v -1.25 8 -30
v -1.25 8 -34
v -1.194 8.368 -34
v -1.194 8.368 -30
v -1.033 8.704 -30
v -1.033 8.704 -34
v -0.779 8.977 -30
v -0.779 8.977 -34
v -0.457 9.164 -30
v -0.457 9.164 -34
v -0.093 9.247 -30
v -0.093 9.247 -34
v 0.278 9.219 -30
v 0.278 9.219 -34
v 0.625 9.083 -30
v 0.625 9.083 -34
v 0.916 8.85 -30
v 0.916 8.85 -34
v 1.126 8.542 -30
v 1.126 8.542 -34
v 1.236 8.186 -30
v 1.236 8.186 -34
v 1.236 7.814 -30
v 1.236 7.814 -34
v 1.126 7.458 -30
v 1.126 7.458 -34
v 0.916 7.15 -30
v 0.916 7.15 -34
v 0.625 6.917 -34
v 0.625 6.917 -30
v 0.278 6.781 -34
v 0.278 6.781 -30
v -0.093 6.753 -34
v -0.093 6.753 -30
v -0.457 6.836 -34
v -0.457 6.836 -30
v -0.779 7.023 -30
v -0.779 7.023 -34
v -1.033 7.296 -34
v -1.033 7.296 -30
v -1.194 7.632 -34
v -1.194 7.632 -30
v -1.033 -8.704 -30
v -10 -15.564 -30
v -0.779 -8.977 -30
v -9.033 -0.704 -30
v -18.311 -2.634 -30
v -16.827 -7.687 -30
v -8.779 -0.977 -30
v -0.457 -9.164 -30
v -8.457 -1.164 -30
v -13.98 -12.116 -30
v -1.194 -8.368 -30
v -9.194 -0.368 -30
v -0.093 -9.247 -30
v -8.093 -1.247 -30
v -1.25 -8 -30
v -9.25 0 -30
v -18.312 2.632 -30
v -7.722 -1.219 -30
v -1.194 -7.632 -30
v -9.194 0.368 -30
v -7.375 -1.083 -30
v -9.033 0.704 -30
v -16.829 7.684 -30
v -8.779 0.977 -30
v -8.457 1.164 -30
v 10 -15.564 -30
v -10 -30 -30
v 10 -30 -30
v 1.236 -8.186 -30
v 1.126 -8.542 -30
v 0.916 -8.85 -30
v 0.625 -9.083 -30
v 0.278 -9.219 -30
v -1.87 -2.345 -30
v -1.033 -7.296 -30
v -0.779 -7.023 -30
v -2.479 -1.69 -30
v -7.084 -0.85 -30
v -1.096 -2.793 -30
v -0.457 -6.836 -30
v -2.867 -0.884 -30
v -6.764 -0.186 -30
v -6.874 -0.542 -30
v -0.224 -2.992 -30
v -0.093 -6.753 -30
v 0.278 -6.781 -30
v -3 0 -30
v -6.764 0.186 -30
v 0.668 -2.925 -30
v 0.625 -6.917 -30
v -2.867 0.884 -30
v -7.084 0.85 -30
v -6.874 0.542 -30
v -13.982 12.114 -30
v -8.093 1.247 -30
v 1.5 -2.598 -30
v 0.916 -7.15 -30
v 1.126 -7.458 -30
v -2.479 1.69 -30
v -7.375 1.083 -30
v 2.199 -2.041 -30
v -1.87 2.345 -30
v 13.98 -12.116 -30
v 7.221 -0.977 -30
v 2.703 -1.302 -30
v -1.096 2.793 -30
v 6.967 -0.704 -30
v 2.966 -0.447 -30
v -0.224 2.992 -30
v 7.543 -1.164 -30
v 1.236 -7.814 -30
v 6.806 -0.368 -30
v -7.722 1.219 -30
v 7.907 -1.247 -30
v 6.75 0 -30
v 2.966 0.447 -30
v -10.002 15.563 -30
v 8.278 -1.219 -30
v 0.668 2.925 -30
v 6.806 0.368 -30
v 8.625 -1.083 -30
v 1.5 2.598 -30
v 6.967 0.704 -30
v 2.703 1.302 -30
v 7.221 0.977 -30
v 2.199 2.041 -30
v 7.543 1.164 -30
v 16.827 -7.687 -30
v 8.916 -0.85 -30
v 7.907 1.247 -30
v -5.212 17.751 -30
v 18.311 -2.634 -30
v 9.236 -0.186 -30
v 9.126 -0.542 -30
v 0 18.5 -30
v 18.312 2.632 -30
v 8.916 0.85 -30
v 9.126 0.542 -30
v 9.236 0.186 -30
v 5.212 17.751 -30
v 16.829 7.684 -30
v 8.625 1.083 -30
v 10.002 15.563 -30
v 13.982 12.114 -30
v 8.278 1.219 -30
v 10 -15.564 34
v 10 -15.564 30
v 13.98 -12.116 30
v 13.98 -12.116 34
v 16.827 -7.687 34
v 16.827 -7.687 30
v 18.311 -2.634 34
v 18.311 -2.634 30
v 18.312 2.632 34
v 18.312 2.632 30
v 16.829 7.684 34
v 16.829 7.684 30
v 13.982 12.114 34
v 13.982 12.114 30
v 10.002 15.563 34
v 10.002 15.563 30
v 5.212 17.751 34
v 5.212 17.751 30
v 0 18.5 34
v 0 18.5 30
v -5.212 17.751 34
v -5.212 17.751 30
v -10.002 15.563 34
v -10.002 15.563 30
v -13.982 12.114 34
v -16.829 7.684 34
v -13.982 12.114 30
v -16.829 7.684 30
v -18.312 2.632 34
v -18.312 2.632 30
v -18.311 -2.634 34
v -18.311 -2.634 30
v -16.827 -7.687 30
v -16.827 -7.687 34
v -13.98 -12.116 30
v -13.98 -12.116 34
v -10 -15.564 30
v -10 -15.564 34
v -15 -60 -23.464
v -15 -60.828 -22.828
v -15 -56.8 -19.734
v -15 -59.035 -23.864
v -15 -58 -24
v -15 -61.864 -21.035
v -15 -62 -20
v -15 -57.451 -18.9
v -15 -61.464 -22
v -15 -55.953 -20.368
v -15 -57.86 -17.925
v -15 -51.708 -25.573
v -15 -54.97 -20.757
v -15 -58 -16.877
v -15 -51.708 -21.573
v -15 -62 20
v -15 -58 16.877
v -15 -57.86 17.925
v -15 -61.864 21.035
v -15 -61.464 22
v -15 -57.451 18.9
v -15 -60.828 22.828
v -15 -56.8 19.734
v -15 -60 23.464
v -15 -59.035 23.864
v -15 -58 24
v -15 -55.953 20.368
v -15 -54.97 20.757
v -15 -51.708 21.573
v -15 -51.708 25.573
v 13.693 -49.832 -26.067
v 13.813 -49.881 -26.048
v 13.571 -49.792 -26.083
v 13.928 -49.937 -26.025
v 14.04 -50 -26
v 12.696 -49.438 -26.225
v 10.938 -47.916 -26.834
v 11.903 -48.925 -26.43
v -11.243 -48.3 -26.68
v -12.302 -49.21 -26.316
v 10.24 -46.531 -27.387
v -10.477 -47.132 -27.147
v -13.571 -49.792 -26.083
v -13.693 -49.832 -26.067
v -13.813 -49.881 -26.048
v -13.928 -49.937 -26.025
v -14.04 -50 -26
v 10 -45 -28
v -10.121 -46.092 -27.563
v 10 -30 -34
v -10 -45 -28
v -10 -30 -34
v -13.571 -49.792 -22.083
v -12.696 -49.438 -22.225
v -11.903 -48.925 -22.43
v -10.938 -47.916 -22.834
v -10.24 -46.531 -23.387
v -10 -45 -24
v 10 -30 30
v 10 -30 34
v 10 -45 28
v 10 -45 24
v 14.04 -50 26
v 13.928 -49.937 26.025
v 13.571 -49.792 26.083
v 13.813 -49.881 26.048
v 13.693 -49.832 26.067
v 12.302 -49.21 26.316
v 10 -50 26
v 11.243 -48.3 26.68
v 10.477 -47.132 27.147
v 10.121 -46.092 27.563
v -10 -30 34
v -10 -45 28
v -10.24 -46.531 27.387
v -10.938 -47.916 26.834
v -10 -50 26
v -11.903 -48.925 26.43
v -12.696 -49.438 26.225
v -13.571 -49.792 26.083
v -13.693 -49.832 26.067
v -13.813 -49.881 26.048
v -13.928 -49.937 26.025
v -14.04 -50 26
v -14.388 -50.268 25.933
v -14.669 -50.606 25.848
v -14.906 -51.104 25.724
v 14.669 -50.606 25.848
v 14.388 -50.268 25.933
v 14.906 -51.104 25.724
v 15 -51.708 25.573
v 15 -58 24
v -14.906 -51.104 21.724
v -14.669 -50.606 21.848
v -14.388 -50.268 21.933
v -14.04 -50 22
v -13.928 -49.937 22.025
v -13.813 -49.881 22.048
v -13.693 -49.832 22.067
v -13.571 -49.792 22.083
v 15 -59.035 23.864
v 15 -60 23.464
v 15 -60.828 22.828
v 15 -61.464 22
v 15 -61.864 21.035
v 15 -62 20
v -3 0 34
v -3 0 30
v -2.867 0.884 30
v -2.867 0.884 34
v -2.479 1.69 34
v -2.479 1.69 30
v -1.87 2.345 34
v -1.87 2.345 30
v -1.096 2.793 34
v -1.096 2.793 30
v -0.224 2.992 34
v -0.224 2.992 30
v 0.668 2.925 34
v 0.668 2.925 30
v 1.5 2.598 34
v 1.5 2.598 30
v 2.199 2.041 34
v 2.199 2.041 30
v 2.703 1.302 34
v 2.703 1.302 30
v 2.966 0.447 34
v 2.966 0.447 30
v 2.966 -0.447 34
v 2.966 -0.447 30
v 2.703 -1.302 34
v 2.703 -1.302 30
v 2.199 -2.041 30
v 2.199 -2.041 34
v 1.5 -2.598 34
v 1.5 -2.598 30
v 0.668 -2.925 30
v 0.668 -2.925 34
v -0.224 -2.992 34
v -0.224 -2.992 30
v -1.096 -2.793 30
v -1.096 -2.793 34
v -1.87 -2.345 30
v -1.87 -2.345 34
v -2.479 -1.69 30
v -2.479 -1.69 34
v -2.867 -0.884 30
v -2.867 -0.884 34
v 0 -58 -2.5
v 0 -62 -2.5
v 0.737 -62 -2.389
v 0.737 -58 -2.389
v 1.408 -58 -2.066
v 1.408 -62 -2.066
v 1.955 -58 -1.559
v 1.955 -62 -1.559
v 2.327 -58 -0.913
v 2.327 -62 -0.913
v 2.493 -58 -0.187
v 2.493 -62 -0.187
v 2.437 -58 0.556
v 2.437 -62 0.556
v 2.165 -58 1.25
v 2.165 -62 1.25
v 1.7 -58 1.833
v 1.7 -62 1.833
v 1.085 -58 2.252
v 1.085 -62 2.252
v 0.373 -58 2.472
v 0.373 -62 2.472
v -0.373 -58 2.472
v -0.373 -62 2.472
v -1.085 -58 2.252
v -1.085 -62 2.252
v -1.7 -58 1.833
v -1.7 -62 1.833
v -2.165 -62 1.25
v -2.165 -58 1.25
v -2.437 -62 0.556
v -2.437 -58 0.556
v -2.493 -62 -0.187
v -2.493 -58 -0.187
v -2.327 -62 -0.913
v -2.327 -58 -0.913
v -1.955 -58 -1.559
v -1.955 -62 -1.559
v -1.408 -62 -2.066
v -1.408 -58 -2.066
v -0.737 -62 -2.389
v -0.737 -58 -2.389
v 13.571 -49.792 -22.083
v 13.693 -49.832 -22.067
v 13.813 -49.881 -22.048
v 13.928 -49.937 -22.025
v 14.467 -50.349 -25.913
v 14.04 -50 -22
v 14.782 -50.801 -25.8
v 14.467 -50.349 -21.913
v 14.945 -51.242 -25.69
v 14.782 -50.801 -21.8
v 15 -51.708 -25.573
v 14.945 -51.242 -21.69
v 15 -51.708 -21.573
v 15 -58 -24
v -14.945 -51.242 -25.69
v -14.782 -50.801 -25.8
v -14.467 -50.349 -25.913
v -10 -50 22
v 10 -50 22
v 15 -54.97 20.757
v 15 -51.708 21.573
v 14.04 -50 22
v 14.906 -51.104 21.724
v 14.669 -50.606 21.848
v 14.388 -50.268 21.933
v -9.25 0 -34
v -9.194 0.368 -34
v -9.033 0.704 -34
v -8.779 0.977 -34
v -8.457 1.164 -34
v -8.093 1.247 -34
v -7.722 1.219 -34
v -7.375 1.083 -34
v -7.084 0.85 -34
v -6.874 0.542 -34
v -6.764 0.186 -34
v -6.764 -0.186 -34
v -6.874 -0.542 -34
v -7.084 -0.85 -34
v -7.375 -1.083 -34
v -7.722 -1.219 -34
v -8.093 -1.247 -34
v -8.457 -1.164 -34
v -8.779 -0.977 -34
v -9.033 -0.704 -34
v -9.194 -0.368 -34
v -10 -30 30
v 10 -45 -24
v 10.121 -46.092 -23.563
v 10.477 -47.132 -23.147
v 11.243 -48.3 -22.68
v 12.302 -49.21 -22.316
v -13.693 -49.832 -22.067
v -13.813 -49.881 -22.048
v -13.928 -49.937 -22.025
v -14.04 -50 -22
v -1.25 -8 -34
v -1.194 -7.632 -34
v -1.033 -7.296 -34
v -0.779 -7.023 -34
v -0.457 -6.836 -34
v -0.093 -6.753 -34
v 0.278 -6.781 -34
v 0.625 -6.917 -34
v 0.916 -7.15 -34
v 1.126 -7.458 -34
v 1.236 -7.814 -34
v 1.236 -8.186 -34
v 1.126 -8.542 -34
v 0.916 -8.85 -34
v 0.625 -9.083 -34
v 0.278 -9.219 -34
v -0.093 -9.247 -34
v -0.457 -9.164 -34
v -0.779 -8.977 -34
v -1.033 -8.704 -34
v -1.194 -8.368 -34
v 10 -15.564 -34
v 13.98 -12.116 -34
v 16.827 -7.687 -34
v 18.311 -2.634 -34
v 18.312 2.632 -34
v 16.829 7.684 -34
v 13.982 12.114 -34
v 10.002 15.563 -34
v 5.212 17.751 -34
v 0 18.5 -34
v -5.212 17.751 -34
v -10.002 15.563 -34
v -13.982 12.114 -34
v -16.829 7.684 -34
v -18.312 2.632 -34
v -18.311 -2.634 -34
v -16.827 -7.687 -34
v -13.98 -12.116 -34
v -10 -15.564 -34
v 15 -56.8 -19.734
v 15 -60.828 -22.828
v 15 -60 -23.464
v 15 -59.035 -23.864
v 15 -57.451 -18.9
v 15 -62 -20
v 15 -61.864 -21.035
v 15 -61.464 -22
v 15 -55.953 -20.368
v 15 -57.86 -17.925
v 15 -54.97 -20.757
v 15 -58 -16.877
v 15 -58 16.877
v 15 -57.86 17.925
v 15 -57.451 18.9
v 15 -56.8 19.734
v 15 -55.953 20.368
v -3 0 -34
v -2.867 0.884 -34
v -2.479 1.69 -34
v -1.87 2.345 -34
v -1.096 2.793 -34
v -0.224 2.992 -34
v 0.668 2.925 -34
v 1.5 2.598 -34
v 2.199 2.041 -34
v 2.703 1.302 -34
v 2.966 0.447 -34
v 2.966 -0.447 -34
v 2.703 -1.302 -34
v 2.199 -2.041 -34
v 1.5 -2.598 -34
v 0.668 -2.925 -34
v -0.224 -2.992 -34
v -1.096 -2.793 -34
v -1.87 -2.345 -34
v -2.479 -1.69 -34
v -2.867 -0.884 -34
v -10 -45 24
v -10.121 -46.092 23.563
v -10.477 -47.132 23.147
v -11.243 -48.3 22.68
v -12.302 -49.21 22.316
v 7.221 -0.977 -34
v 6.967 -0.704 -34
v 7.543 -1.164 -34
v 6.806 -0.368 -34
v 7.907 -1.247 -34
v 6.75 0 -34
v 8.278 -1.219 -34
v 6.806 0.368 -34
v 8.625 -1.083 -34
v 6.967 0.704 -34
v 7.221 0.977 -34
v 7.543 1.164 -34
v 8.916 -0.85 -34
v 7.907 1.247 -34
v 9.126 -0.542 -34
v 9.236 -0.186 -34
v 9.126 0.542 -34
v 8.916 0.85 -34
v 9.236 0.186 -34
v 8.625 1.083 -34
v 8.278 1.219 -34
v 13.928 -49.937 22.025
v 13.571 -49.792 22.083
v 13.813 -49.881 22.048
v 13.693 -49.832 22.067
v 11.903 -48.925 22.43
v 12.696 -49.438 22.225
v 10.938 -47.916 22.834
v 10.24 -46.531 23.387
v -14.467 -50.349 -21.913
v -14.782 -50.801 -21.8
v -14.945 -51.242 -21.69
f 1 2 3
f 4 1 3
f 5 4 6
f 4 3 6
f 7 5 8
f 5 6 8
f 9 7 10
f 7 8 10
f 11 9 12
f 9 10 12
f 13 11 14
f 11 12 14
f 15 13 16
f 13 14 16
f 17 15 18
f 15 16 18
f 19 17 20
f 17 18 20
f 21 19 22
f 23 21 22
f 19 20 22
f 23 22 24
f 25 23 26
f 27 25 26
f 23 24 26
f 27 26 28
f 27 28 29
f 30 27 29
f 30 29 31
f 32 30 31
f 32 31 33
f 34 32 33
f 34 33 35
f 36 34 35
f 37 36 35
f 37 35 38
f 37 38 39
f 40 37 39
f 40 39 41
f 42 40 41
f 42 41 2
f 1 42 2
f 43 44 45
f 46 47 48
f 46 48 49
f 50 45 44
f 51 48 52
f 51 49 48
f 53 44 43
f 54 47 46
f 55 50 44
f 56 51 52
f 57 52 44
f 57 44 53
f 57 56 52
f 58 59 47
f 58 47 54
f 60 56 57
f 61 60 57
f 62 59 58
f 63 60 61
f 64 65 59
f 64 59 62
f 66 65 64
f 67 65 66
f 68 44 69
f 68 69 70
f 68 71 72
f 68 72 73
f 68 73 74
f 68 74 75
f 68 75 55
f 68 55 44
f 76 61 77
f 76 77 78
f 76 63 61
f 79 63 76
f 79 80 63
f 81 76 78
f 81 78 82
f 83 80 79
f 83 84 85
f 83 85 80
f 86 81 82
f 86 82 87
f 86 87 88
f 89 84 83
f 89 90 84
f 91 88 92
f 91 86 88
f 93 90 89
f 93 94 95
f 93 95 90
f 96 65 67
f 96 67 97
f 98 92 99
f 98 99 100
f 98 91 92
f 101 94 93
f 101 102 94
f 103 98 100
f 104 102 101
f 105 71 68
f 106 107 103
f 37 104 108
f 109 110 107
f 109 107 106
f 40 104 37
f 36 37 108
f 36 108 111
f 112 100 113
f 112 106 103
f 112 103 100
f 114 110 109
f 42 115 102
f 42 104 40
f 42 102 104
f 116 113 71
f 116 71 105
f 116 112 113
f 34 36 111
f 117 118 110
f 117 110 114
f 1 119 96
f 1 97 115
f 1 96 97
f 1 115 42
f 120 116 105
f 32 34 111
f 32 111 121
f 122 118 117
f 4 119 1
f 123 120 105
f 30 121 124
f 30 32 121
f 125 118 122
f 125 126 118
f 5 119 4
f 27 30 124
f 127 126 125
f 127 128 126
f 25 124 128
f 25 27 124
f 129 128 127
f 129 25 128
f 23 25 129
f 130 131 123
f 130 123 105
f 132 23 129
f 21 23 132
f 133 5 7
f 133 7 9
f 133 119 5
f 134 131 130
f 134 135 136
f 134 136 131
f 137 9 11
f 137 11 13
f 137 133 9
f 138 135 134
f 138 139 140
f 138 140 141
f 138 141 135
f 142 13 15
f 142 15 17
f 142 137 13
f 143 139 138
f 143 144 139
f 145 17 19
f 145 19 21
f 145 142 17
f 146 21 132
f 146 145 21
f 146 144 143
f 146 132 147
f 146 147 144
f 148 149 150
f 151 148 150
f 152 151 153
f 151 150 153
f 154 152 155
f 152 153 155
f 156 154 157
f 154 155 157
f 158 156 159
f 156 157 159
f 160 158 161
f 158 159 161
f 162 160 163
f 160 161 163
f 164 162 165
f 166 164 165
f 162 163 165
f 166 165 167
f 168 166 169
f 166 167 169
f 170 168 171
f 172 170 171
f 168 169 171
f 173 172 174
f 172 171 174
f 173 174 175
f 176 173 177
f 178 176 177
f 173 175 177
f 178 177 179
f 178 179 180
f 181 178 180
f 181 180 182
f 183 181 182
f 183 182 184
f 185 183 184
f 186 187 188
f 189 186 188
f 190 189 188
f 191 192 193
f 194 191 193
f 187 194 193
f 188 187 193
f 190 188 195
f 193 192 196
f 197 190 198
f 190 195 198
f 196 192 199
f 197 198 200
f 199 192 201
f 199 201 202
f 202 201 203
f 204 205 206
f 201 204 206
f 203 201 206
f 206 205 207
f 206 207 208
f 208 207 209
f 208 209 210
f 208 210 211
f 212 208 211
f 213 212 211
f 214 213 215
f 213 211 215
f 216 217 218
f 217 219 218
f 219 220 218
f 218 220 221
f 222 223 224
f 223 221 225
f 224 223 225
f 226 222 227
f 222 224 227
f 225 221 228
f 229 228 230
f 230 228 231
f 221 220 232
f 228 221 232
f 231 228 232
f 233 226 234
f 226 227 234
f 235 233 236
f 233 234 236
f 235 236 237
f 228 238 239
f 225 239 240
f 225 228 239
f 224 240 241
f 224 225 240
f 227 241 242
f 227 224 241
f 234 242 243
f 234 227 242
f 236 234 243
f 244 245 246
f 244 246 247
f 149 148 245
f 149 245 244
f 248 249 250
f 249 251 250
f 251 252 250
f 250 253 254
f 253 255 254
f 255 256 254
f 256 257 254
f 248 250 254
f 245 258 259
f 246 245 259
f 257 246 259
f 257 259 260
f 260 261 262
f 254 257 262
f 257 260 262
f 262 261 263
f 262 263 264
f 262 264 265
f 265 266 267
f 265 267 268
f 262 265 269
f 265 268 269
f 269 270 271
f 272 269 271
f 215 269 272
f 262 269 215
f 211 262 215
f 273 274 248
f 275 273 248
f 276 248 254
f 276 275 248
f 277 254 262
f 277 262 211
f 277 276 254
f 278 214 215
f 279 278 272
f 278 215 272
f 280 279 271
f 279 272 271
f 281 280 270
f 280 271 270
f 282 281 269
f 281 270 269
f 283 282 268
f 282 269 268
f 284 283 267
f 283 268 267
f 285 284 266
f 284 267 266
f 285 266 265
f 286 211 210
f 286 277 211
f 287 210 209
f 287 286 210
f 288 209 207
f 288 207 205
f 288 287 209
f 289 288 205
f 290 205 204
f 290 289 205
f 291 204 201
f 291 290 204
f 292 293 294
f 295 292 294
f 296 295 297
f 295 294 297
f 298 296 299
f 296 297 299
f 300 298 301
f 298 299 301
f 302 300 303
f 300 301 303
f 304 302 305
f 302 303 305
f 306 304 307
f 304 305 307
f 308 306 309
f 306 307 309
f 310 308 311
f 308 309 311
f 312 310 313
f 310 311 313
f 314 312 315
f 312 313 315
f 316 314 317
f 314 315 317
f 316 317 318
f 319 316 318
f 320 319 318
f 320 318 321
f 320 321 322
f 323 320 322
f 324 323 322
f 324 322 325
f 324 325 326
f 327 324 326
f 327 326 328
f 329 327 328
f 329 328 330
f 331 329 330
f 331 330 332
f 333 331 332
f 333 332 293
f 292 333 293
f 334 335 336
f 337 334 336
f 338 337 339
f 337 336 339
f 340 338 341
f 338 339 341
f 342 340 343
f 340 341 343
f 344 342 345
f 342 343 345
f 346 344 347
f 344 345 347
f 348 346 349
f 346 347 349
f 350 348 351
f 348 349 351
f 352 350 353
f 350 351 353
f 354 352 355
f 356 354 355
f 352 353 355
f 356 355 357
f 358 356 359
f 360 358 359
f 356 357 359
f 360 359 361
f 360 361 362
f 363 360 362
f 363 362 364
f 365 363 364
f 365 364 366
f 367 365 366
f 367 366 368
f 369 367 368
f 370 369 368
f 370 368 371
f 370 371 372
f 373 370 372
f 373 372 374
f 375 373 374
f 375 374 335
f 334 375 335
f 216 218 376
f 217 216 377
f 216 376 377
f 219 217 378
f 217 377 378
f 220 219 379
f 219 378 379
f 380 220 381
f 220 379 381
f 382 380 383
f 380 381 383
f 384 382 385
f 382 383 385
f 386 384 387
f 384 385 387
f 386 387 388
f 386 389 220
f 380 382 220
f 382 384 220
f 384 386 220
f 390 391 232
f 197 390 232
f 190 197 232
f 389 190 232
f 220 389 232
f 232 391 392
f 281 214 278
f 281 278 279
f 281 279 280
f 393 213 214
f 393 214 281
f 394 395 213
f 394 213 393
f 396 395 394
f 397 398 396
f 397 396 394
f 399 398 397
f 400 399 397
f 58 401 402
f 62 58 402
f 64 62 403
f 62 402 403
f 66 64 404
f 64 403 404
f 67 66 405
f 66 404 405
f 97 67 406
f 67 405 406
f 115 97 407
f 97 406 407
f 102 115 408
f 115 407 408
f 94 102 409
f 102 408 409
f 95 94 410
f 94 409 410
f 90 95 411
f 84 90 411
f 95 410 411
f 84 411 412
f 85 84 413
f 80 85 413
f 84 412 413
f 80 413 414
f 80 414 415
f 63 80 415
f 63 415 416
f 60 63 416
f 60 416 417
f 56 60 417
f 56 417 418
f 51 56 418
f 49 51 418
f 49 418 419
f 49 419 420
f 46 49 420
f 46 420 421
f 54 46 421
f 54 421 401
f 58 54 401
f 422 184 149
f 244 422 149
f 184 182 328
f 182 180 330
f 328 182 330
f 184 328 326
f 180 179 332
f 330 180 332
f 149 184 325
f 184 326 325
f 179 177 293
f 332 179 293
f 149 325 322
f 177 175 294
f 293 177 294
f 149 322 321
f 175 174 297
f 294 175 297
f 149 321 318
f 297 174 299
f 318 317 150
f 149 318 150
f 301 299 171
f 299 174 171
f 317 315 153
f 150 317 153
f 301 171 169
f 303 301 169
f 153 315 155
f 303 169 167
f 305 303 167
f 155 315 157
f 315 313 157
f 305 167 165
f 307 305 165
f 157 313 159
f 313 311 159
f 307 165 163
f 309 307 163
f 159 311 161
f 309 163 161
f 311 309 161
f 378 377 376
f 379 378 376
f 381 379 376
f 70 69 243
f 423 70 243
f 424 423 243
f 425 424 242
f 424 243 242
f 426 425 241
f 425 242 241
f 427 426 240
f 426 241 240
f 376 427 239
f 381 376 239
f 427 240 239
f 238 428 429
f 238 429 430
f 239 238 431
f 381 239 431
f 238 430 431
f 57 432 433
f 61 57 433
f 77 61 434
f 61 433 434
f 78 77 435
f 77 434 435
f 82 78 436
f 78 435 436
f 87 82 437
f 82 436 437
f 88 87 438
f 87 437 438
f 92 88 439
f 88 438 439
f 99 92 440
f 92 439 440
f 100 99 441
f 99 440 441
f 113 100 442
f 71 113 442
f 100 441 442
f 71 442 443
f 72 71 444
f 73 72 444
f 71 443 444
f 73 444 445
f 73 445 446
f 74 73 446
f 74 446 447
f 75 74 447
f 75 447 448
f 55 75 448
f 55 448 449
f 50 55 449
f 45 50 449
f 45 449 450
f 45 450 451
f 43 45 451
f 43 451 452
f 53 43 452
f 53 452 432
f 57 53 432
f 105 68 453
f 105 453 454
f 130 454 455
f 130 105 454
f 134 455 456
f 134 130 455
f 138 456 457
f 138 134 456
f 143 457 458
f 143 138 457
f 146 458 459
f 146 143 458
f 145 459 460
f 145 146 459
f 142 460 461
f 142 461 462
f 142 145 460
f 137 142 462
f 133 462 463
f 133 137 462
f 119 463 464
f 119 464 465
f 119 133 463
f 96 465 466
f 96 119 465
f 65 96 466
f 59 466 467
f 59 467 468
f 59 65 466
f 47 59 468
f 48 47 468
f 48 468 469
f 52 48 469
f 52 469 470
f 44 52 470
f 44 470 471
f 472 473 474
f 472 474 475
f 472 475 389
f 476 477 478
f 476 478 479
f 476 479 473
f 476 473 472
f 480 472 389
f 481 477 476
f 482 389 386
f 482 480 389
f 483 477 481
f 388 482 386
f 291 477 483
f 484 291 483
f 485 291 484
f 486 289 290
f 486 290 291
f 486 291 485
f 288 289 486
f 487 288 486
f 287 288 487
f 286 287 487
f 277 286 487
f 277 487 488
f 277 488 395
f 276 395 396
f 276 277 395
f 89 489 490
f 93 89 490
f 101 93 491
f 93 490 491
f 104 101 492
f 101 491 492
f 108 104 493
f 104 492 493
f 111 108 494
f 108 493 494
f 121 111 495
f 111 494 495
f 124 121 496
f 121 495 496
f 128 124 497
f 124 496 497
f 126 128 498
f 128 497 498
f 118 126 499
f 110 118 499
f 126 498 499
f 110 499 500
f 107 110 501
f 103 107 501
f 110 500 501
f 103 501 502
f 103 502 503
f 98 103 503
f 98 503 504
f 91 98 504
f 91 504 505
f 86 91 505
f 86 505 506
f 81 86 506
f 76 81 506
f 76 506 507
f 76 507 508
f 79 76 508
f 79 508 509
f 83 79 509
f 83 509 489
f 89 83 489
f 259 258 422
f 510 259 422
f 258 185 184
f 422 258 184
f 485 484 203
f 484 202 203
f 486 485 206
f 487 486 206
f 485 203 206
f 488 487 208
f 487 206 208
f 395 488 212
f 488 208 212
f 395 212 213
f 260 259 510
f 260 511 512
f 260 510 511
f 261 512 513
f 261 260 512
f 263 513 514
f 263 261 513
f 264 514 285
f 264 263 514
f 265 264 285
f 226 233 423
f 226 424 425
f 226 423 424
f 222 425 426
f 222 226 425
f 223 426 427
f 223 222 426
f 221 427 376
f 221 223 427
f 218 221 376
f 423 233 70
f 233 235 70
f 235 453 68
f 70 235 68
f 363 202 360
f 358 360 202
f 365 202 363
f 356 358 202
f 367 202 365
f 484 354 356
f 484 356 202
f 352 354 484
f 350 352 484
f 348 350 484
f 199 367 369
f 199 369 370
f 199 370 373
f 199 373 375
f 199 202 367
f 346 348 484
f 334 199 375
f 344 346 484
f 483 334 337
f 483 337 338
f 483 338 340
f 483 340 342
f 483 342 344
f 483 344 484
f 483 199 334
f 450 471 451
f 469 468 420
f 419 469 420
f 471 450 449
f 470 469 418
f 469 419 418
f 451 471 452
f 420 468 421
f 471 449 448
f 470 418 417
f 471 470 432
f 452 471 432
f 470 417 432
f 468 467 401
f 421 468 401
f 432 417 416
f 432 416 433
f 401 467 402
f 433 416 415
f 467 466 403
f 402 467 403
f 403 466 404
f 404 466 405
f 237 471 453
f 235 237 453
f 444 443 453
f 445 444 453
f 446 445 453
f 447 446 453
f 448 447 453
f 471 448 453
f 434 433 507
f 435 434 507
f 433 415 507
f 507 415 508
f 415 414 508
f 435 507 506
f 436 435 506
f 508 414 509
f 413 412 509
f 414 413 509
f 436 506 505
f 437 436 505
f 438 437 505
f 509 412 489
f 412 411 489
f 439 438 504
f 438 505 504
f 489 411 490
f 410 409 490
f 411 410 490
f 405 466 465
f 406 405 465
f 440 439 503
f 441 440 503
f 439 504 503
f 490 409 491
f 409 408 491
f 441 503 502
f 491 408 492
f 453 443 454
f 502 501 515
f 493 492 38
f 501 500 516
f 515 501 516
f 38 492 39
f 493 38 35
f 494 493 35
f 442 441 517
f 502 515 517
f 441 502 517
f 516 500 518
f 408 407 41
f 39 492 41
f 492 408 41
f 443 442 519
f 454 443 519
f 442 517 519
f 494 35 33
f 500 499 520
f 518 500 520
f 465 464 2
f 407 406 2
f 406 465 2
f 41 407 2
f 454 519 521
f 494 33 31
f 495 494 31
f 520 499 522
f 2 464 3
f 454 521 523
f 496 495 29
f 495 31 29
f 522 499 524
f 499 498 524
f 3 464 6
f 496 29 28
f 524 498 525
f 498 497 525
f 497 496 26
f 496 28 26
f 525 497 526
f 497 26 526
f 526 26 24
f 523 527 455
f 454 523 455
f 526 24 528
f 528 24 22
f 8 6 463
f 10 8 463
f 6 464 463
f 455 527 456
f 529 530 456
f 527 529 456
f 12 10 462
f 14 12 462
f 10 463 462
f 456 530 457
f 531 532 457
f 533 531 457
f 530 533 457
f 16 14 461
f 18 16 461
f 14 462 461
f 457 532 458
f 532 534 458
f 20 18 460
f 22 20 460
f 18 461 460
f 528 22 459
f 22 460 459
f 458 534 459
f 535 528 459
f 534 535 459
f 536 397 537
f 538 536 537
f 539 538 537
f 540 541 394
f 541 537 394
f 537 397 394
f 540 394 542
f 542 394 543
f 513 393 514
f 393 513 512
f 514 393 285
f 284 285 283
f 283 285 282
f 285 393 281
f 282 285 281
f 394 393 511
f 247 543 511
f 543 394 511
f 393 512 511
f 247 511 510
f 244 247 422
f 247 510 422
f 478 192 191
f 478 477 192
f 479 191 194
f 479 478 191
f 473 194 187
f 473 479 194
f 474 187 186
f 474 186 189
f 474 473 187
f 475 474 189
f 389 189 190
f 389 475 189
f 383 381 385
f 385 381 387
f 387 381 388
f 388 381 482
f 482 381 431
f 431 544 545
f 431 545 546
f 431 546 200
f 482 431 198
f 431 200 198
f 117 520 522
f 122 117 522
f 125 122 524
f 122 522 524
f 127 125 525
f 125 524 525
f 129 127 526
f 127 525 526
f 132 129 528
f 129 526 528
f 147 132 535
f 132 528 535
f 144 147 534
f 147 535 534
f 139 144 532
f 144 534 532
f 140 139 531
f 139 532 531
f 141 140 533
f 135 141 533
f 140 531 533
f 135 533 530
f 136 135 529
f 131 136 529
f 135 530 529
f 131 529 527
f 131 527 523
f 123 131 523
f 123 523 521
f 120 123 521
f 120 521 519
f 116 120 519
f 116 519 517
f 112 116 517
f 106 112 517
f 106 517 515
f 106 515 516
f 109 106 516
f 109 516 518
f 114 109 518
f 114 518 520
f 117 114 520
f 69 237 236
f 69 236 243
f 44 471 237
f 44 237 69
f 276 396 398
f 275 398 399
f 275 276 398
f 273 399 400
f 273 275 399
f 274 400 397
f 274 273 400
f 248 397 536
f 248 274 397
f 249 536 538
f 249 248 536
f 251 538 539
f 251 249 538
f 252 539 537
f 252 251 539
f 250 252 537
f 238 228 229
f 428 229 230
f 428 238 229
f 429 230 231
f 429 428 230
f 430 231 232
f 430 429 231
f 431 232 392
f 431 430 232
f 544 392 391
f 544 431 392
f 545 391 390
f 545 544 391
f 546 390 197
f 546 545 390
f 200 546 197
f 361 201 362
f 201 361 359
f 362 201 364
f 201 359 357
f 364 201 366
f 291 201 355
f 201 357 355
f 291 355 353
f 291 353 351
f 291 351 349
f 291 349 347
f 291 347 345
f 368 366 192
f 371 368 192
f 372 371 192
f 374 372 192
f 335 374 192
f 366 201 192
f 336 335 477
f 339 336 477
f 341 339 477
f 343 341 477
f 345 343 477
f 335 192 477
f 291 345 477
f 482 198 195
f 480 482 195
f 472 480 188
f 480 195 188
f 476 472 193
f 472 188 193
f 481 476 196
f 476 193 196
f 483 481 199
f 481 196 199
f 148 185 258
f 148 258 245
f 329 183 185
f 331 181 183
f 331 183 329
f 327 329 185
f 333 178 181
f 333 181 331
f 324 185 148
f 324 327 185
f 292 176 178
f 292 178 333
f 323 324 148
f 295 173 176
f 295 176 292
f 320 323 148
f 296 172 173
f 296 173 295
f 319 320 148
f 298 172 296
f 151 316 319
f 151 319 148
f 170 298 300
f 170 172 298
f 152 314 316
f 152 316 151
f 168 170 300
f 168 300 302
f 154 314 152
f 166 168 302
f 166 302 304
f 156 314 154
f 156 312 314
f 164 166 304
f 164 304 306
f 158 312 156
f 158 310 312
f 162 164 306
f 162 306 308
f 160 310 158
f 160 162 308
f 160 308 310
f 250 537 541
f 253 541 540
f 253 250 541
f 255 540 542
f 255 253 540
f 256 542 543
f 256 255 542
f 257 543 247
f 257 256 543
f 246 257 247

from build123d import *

# Parameters (mm, degrees)
EXTRUDE_1_DEPTH        = 4
EXTRUDE_2_DEPTH        = 10
EXTRUDE_3_DEPTH        = 15
FILLET_1_R             = 5
FILLET_2_R             = 5
SKETCH_4_W             = 30
SKETCH_4_H             = 24
EXTRUDE_4_DEPTH        = 4
FILLET_3_R             = 4
FILLET_4_R             = 4
FILLET_5_R             = 2
FILLET_6_R             = 2
MIRROR_START           = -15
MIRROR_7_DEPTH         = 30
MIRROR_10_COPY_1_DEPTH = 4
MIRROR_10_COPY_2_DEPTH = 10
MIRROR_10_COPY_3_DEPTH = 4
MIRROR_10_COPY_4_DEPTH = 10
FILLET_7_R             = 4
FILLET_8_R             = 5
FILLET_9_R             = 2
SKETCH_5_R             = 2.5
CUT_EXTRUDE_1_DEPTH    = 10
SKETCH_6_R             = 3
CUT_EXTRUDE_2_DEPTH    = 94.862931981
SKETCH_7_R             = 1.25
CUT_EXTRUDE_3_DEPTH    = 10


# Read off the part's stored shape, not the designer's step: 镜向7
# Some blends are built 0.0001 mm under size
with BuildPart() as part:
    # 草图1 → 凸台-拉伸1 (new body)
    with BuildSketch(Plane.XY.offset(30)):
        with BuildLine():
            Line((-10, -15.564382416), (-10, -30))
            Line((-10, -30), (10, -30))
            Line((10, -30), (10, -15.564382416))
            ThreePointArc((10, -15.564382416), (0, 18.5), (-10, -15.564382416))
        make_face()
    extrude_1 = extrude(amount=EXTRUDE_1_DEPTH)

    # 草图2 → 凸台-拉伸2 (add, symmetric)
    with BuildSketch(Plane(origin=(0, 0, 0), x_dir=(0, 0, -1), z_dir=(1, 0, 0))):
        Polygon((-30, -30), (-34, -30), (-26, -50), (-22, -50), align=None)
    extrude_2 = extrude(amount=EXTRUDE_2_DEPTH, both=True)

    # 草图3 → 凸台-拉伸3 (add, symmetric)
    with BuildSketch(Plane(origin=(0, 0, 0), x_dir=(0, 0, -1), z_dir=(1, 0, 0))):
        Polygon((-22, -50), (-26, -50), (-24, -58), (-20, -58), align=None)
    extrude(amount=EXTRUDE_3_DEPTH, both=True)

    # 圆角1
    # the kernel refuses this fillet: 5 mm, written as the material it adds along each edge
    with BuildSketch(Plane(origin=(-10, -50, 38.5), x_dir=(-1, 0, 0), z_dir=(0, 0, -1))) as fillet_1_piece_1_section:
        with BuildLine():
            CenterArc((FILLET_1_R, FILLET_1_R), FILLET_1_R, 180, 90)
            Line((0, FILLET_1_R), (0, 0))
            Line((0, 0), (FILLET_1_R, 0))
        make_face()
    fillet_1_piece_1 = extrude(amount=29, mode=Mode.PRIVATE)
    fillet_1_piece_1 = split(fillet_1_piece_1, bisect_by=Plane(origin=(-10.532362598, -47.811458148, 26.547135463), z_dir=(0, -0.24253562503633297, 0.9701425001453319)), keep=Keep.TOP, mode=Mode.PRIVATE)
    fillet_1_piece_1 = split(fillet_1_piece_1, bisect_by=Plane(origin=(-10.532362598, -47.905028454, 26.837988618), z_dir=(0, 0.3713906763541037, -0.9284766908852594)), keep=Keep.TOP, mode=Mode.PRIVATE)
    add(fillet_1_piece_1)
    with BuildSketch(Plane(origin=(-10, -50, 38.5), x_dir=(-1, 0, 0), z_dir=(0, 0, -1))) as fillet_1_piece_2_section:
        with BuildLine():
            CenterArc((FILLET_1_R, FILLET_1_R), FILLET_1_R, 180, 90)
            Line((0, FILLET_1_R), (0, 0))
            Line((0, 0), (FILLET_1_R, 0))
        make_face()
    fillet_1_piece_2 = extrude(amount=29, mode=Mode.PRIVATE)
    fillet_1_piece_2 = split(fillet_1_piece_2, bisect_by=Plane(origin=(-11.158452705, -48.423398816, 22.394150296), z_dir=(0, -0.2425356250363334, 0.9701425001453319)), keep=Keep.TOP, mode=Mode.PRIVATE)
    fillet_1_piece_2 = split(fillet_1_piece_2, bisect_by=Plane(origin=(-11.158452705, -49.364575286, 26.158856178), z_dir=(0, 0.24253562503633297, -0.9701425001453319)), keep=Keep.TOP, mode=Mode.PRIVATE)
    fillet_1_piece_2 = split(fillet_1_piece_2, bisect_by=Plane(origin=(-11.158452705, -49.630929403, 26.147628239), z_dir=(0, 0.3713906763541037, -0.9284766908852594)), keep=Keep.TOP, mode=Mode.PRIVATE)
    fillet_1_piece_2 = split(fillet_1_piece_2, bisect_by=Plane(origin=(-11.158452705, -48.251619058, 22.699352377), z_dir=(0, -0.3713906763541037, 0.9284766908852594)), keep=Keep.TOP, mode=Mode.PRIVATE)
    add(fillet_1_piece_2)

    # 圆角2
    # the kernel refuses this fillet: 5 mm, written as the material it adds along each edge
    with BuildSketch(Plane(origin=(10, -50, 38.5), x_dir=(0, 1, 0), z_dir=(0, 0, -1))) as fillet_2_piece_1_section:
        with BuildLine():
            CenterArc((FILLET_2_R, FILLET_2_R), FILLET_2_R, 180, 90)
            Line((0, FILLET_2_R), (0, 0))
            Line((0, 0), (FILLET_2_R, 0))
        make_face()
    fillet_2_piece_1 = extrude(amount=29, mode=Mode.PRIVATE)
    fillet_2_piece_1 = split(fillet_2_piece_1, bisect_by=Plane(origin=(10.532362598, -47.905028454, 26.837988618), z_dir=(0, 0.3713906763541038, -0.9284766908852593)), keep=Keep.TOP, mode=Mode.PRIVATE)
    fillet_2_piece_1 = split(fillet_2_piece_1, bisect_by=Plane(origin=(10.532362598, -47.811458148, 26.547135463), z_dir=(0, -0.24253562503633297, 0.9701425001453319)), keep=Keep.TOP, mode=Mode.PRIVATE)
    add(fillet_2_piece_1)
    with BuildSketch(Plane(origin=(10, -50, 38.5), x_dir=(0, 1, 0), z_dir=(0, 0, -1))) as fillet_2_piece_2_section:
        with BuildLine():
            CenterArc((FILLET_2_R, FILLET_2_R), FILLET_2_R, 180, 90)
            Line((0, FILLET_2_R), (0, 0))
            Line((0, 0), (FILLET_2_R, 0))
        make_face()
    fillet_2_piece_2 = extrude(amount=29, mode=Mode.PRIVATE)
    fillet_2_piece_2 = split(fillet_2_piece_2, bisect_by=Plane(origin=(11.158452705, -48.251619058, 22.699352377), z_dir=(0, -0.3713906763541038, 0.9284766908852593)), keep=Keep.TOP, mode=Mode.PRIVATE)
    fillet_2_piece_2 = split(fillet_2_piece_2, bisect_by=Plane(origin=(11.158452705, -49.630929403, 26.147628239), z_dir=(0, 0.3713906763541038, -0.9284766908852593)), keep=Keep.TOP, mode=Mode.PRIVATE)
    fillet_2_piece_2 = split(fillet_2_piece_2, bisect_by=Plane(origin=(11.158452705, -48.423398816, 22.394150296), z_dir=(0, -0.2425356250363334, 0.9701425001453319)), keep=Keep.TOP, mode=Mode.PRIVATE)
    fillet_2_piece_2 = split(fillet_2_piece_2, bisect_by=Plane(origin=(11.158452705, -49.364575286, 26.158856178), z_dir=(0, 0.24253562503633297, -0.9701425001453319)), keep=Keep.TOP, mode=Mode.PRIVATE)
    add(fillet_2_piece_2)

    # 草图4 → 凸台-拉伸4 (add)
    with BuildSketch(Plane.XZ.offset(58)):
        with Locations((0, 12)):
            Rectangle(SKETCH_4_W, SKETCH_4_H)
    extrude_4 = extrude(amount=EXTRUDE_4_DEPTH)

    # 圆角3
    fillet_3_edges = [part.edges().sort_by_distance(p)[0] for p in [
        (0, -62, 24),
    ]]
    fillet(fillet_3_edges, radius=FILLET_3_R - 0.0001)  # a hair under: the kernel refuses the full size

    # 圆角4
    fillet_4_edges = [part.edges().sort_by_distance(p)[0] for p in [
        (0, -58, 20),
    ]]
    fillet(fillet_4_edges, radius=FILLET_4_R)

    # 圆角5
    fillet_5_edges = [part.edges().sort_by_distance(p)[0] for p in [
        (-15, -50, 24),
    ]]
    fillet(fillet_5_edges, radius=FILLET_5_R)

    # 圆角6
    fillet_6_edges = [part.edges().sort_by_distance(p)[0] for p in [
        (15, -50, 24),
    ]]
    fillet(fillet_6_edges, radius=FILLET_6_R)

    # 镜向6: 凸台-拉伸4 across plane
    add(extrude_4.mirror(Plane.XY))

    # 镜向7 outline → 镜向7 (add)
    with BuildSketch(Plane.YZ.offset(MIRROR_START)):
        with BuildLine():
            Line((-50, -22), (-54.9701425, -20.757464375))
            ThreePointArc((-54.9701425, -20.757464375), (-57.152821752, -19.338543212), (-58, -16.876894374))
            Line((-58, -16.876894374), (-58, -24))
            Line((-58, -24), (-50, -26))
            Line((-50, -26), (-50, -22))
        make_face()
    extrude(amount=MIRROR_7_DEPTH)

    # 镜向10 copy 1 sketch → 镜向10 copy 1 (add)
    with BuildSketch(Plane.XY.offset(30)):
        with BuildLine():
            Line((-10, -15.564382416), (-10, -30))
            Line((-10, -30), (10, -30))
            Line((10, -30), (10, -15.564382416))
            ThreePointArc((10, -15.564382416), (0, 18.5), (-10, -15.564382416))
        make_face()
    extrude(amount=MIRROR_10_COPY_1_DEPTH)

    # 镜向10 copy 2 sketch → 镜向10 copy 2 (add, symmetric)
    with BuildSketch(Plane(origin=(0, 0, 0), x_dir=(0, 0, -1), z_dir=(1, 0, 0))):
        Polygon((-30, -30), (-34, -30), (-26, -50), (-22, -50), align=None)
    extrude(amount=MIRROR_10_COPY_2_DEPTH, both=True)



with BuildPart() as mirror_9_1:
    # 镜向9: 凸台-拉伸1, 凸台-拉伸2 across plane
    add(extrude_1.mirror(Plane.XY))
    add(extrude_2.mirror(Plane.XY))

    # 镜向10 copy 3 sketch → 镜向10 copy 3 (add)
    with BuildSketch(Plane(origin=(0, 0, -30), x_dir=(1, 0, 0), z_dir=(0, 0, -1))):
        with BuildLine():
            Line((-10, 15.564382416), (-10, 30))
            Line((-10, 30), (10, 30))
            Line((10, 30), (10, 15.564382416))
            ThreePointArc((10, 15.564382416), (0, -18.5), (-10, 15.564382416))
        make_face()
    extrude(amount=MIRROR_10_COPY_3_DEPTH)


with BuildPart() as part_1:
    add(part.part)

    add(mirror_9_1.part)  # 镜向10 copy 4 merges 镜向9_1
    # 镜向10 copy 4 sketch → 镜向10 copy 4 (add, symmetric)
    with BuildSketch(Plane(origin=(0, 0, 0), x_dir=(0, 0, 1), z_dir=(1, 0, 0))):
        Polygon((-30, 30), (-34, 30), (-26, 50), (-22, 50), align=None)
    extrude(amount=MIRROR_10_COPY_4_DEPTH, both=True)

    # 圆角7
    fillet_7_edges = [part_1.edges().sort_by_distance(p)[0] for p in [
        (0, -62, -24),
    ]]
    fillet(fillet_7_edges, radius=FILLET_7_R - 0.0001)  # a hair under: the kernel refuses the full size

    # 圆角8
    # the kernel refuses this fillet: 5 mm, written as the material it adds along each edge
    with BuildSketch(Plane(origin=(10, -50, -38.5), x_dir=(1, 0, 0), z_dir=(0, 0, 1))) as fillet_8_piece_1_section:
        with BuildLine():
            CenterArc((FILLET_8_R, FILLET_8_R), FILLET_8_R, 180, 90)
            Line((0, FILLET_8_R), (0, 0))
            Line((0, 0), (FILLET_8_R, 0))
        make_face()
    fillet_8_piece_1 = extrude(amount=29, mode=Mode.PRIVATE)
    fillet_8_piece_1 = split(fillet_8_piece_1, bisect_by=Plane(origin=(10.532362598, -47.811458148, -26.547135463), z_dir=(0, -0.24253562503633297, -0.9701425001453319)), keep=Keep.TOP, mode=Mode.PRIVATE)
    fillet_8_piece_1 = split(fillet_8_piece_1, bisect_by=Plane(origin=(10.532362598, -47.905028454, -26.837988618), z_dir=(0, 0.3713906763541037, 0.9284766908852594)), keep=Keep.TOP, mode=Mode.PRIVATE)
    add(fillet_8_piece_1)
    with BuildSketch(Plane(origin=(10, -50, -38.5), x_dir=(1, 0, 0), z_dir=(0, 0, 1))) as fillet_8_piece_2_section:
        with BuildLine():
            CenterArc((FILLET_8_R, FILLET_8_R), FILLET_8_R, 180, 90)
            Line((0, FILLET_8_R), (0, 0))
            Line((0, 0), (FILLET_8_R, 0))
        make_face()
    fillet_8_piece_2 = extrude(amount=29, mode=Mode.PRIVATE)
    fillet_8_piece_2 = split(fillet_8_piece_2, bisect_by=Plane(origin=(11.158452705, -49.364575286, -26.158856178), z_dir=(0, 0.24253562503633297, 0.9701425001453319)), keep=Keep.TOP, mode=Mode.PRIVATE)
    fillet_8_piece_2 = split(fillet_8_piece_2, bisect_by=Plane(origin=(11.158452705, -48.423398816, -22.394150296), z_dir=(0, -0.24253562503633266, -0.970142500145332)), keep=Keep.TOP, mode=Mode.PRIVATE)
    fillet_8_piece_2 = split(fillet_8_piece_2, bisect_by=Plane(origin=(11.158452705, -49.630929403, -26.147628239), z_dir=(0, 0.3713906763541037, 0.9284766908852594)), keep=Keep.TOP, mode=Mode.PRIVATE)
    fillet_8_piece_2 = split(fillet_8_piece_2, bisect_by=Plane(origin=(11.158452705, -48.251619058, -22.699352377), z_dir=(0, -0.3713906763541037, -0.9284766908852594)), keep=Keep.TOP, mode=Mode.PRIVATE)
    add(fillet_8_piece_2)
    with BuildSketch(Plane(origin=(-10, -50, -38.5), x_dir=(-1, 0, 0), z_dir=(0, 0, 1))) as fillet_8_piece_3_section:
        with BuildLine():
            CenterArc((FILLET_8_R, -FILLET_8_R), FILLET_8_R, 90, 90)
            Line((0, -FILLET_8_R), (0, 0))
            Line((0, 0), (FILLET_8_R, 0))
        make_face()
    fillet_8_piece_3 = extrude(amount=29, mode=Mode.PRIVATE)
    fillet_8_piece_3 = split(fillet_8_piece_3, bisect_by=Plane(origin=(-10.532362598, -47.811458148, -26.547135463), z_dir=(0, -0.24253562503633297, -0.9701425001453319)), keep=Keep.TOP, mode=Mode.PRIVATE)
    fillet_8_piece_3 = split(fillet_8_piece_3, bisect_by=Plane(origin=(-10.532362598, -47.905028454, -26.837988618), z_dir=(0, 0.3713906763541037, 0.9284766908852594)), keep=Keep.TOP, mode=Mode.PRIVATE)
    add(fillet_8_piece_3)
    with BuildSketch(Plane(origin=(-10, -50, -38.5), x_dir=(-1, 0, 0), z_dir=(0, 0, 1))) as fillet_8_piece_4_section:
        with BuildLine():
            CenterArc((FILLET_8_R, -FILLET_8_R), FILLET_8_R, 90, 90)
            Line((0, -FILLET_8_R), (0, 0))
            Line((0, 0), (FILLET_8_R, 0))
        make_face()
    fillet_8_piece_4 = extrude(amount=29, mode=Mode.PRIVATE)
    fillet_8_piece_4 = split(fillet_8_piece_4, bisect_by=Plane(origin=(-11.158452705, -49.364575286, -26.158856178), z_dir=(0, 0.24253562503633297, 0.9701425001453319)), keep=Keep.TOP, mode=Mode.PRIVATE)
    fillet_8_piece_4 = split(fillet_8_piece_4, bisect_by=Plane(origin=(-11.158452705, -48.423398816, -22.394150296), z_dir=(0, -0.24253562503633266, -0.970142500145332)), keep=Keep.TOP, mode=Mode.PRIVATE)
    fillet_8_piece_4 = split(fillet_8_piece_4, bisect_by=Plane(origin=(-11.158452705, -49.630929403, -26.147628239), z_dir=(0, 0.3713906763541037, 0.9284766908852594)), keep=Keep.TOP, mode=Mode.PRIVATE)
    fillet_8_piece_4 = split(fillet_8_piece_4, bisect_by=Plane(origin=(-11.158452705, -48.251619058, -22.699352377), z_dir=(0, -0.3713906763541037, -0.9284766908852594)), keep=Keep.TOP, mode=Mode.PRIVATE)
    add(fillet_8_piece_4)

    # 圆角9
    fillet_9_edges = [part_1.edges().sort_by_distance(p)[0] for p in [
        (15, -50, -24),
        (-15, -50, -24),
    ]]
    fillet(fillet_9_edges, radius=FILLET_9_R)

    # 草图5 → 切除-拉伸1 (cut)
    with BuildSketch(Plane.XZ.offset(62)):
        with Locations(Location((0, 0, 0), (0, 0, 270))):
            Circle(SKETCH_5_R)
    extrude(amount=-CUT_EXTRUDE_1_DEPTH, mode=Mode.SUBTRACT)

    # 草图6 → 切除-拉伸2 (cut, through all)
    with BuildSketch(Plane(origin=(0, 0, -34), x_dir=(-1, 0, 0), z_dir=(0, 0, -1))):
        Circle(SKETCH_6_R)
    extrude(amount=-CUT_EXTRUDE_2_DEPTH, mode=Mode.SUBTRACT)

    # 草图7 → 切除-拉伸3 (cut)
    with BuildSketch(Plane(origin=(0, 0, -34), x_dir=(-1, 0, 0), z_dir=(0, 0, -1))):
        with Locations((0, 8)):
            Circle(SKETCH_7_R)
        with Locations((8, 0)):
            Circle(SKETCH_7_R)
        with Locations((0, -8)):
            Circle(SKETCH_7_R)
        with Locations((-8, 0)):
            Circle(SKETCH_7_R)
    extrude(amount=-CUT_EXTRUDE_3_DEPTH, mode=Mode.SUBTRACT)


solid = part_1.part
